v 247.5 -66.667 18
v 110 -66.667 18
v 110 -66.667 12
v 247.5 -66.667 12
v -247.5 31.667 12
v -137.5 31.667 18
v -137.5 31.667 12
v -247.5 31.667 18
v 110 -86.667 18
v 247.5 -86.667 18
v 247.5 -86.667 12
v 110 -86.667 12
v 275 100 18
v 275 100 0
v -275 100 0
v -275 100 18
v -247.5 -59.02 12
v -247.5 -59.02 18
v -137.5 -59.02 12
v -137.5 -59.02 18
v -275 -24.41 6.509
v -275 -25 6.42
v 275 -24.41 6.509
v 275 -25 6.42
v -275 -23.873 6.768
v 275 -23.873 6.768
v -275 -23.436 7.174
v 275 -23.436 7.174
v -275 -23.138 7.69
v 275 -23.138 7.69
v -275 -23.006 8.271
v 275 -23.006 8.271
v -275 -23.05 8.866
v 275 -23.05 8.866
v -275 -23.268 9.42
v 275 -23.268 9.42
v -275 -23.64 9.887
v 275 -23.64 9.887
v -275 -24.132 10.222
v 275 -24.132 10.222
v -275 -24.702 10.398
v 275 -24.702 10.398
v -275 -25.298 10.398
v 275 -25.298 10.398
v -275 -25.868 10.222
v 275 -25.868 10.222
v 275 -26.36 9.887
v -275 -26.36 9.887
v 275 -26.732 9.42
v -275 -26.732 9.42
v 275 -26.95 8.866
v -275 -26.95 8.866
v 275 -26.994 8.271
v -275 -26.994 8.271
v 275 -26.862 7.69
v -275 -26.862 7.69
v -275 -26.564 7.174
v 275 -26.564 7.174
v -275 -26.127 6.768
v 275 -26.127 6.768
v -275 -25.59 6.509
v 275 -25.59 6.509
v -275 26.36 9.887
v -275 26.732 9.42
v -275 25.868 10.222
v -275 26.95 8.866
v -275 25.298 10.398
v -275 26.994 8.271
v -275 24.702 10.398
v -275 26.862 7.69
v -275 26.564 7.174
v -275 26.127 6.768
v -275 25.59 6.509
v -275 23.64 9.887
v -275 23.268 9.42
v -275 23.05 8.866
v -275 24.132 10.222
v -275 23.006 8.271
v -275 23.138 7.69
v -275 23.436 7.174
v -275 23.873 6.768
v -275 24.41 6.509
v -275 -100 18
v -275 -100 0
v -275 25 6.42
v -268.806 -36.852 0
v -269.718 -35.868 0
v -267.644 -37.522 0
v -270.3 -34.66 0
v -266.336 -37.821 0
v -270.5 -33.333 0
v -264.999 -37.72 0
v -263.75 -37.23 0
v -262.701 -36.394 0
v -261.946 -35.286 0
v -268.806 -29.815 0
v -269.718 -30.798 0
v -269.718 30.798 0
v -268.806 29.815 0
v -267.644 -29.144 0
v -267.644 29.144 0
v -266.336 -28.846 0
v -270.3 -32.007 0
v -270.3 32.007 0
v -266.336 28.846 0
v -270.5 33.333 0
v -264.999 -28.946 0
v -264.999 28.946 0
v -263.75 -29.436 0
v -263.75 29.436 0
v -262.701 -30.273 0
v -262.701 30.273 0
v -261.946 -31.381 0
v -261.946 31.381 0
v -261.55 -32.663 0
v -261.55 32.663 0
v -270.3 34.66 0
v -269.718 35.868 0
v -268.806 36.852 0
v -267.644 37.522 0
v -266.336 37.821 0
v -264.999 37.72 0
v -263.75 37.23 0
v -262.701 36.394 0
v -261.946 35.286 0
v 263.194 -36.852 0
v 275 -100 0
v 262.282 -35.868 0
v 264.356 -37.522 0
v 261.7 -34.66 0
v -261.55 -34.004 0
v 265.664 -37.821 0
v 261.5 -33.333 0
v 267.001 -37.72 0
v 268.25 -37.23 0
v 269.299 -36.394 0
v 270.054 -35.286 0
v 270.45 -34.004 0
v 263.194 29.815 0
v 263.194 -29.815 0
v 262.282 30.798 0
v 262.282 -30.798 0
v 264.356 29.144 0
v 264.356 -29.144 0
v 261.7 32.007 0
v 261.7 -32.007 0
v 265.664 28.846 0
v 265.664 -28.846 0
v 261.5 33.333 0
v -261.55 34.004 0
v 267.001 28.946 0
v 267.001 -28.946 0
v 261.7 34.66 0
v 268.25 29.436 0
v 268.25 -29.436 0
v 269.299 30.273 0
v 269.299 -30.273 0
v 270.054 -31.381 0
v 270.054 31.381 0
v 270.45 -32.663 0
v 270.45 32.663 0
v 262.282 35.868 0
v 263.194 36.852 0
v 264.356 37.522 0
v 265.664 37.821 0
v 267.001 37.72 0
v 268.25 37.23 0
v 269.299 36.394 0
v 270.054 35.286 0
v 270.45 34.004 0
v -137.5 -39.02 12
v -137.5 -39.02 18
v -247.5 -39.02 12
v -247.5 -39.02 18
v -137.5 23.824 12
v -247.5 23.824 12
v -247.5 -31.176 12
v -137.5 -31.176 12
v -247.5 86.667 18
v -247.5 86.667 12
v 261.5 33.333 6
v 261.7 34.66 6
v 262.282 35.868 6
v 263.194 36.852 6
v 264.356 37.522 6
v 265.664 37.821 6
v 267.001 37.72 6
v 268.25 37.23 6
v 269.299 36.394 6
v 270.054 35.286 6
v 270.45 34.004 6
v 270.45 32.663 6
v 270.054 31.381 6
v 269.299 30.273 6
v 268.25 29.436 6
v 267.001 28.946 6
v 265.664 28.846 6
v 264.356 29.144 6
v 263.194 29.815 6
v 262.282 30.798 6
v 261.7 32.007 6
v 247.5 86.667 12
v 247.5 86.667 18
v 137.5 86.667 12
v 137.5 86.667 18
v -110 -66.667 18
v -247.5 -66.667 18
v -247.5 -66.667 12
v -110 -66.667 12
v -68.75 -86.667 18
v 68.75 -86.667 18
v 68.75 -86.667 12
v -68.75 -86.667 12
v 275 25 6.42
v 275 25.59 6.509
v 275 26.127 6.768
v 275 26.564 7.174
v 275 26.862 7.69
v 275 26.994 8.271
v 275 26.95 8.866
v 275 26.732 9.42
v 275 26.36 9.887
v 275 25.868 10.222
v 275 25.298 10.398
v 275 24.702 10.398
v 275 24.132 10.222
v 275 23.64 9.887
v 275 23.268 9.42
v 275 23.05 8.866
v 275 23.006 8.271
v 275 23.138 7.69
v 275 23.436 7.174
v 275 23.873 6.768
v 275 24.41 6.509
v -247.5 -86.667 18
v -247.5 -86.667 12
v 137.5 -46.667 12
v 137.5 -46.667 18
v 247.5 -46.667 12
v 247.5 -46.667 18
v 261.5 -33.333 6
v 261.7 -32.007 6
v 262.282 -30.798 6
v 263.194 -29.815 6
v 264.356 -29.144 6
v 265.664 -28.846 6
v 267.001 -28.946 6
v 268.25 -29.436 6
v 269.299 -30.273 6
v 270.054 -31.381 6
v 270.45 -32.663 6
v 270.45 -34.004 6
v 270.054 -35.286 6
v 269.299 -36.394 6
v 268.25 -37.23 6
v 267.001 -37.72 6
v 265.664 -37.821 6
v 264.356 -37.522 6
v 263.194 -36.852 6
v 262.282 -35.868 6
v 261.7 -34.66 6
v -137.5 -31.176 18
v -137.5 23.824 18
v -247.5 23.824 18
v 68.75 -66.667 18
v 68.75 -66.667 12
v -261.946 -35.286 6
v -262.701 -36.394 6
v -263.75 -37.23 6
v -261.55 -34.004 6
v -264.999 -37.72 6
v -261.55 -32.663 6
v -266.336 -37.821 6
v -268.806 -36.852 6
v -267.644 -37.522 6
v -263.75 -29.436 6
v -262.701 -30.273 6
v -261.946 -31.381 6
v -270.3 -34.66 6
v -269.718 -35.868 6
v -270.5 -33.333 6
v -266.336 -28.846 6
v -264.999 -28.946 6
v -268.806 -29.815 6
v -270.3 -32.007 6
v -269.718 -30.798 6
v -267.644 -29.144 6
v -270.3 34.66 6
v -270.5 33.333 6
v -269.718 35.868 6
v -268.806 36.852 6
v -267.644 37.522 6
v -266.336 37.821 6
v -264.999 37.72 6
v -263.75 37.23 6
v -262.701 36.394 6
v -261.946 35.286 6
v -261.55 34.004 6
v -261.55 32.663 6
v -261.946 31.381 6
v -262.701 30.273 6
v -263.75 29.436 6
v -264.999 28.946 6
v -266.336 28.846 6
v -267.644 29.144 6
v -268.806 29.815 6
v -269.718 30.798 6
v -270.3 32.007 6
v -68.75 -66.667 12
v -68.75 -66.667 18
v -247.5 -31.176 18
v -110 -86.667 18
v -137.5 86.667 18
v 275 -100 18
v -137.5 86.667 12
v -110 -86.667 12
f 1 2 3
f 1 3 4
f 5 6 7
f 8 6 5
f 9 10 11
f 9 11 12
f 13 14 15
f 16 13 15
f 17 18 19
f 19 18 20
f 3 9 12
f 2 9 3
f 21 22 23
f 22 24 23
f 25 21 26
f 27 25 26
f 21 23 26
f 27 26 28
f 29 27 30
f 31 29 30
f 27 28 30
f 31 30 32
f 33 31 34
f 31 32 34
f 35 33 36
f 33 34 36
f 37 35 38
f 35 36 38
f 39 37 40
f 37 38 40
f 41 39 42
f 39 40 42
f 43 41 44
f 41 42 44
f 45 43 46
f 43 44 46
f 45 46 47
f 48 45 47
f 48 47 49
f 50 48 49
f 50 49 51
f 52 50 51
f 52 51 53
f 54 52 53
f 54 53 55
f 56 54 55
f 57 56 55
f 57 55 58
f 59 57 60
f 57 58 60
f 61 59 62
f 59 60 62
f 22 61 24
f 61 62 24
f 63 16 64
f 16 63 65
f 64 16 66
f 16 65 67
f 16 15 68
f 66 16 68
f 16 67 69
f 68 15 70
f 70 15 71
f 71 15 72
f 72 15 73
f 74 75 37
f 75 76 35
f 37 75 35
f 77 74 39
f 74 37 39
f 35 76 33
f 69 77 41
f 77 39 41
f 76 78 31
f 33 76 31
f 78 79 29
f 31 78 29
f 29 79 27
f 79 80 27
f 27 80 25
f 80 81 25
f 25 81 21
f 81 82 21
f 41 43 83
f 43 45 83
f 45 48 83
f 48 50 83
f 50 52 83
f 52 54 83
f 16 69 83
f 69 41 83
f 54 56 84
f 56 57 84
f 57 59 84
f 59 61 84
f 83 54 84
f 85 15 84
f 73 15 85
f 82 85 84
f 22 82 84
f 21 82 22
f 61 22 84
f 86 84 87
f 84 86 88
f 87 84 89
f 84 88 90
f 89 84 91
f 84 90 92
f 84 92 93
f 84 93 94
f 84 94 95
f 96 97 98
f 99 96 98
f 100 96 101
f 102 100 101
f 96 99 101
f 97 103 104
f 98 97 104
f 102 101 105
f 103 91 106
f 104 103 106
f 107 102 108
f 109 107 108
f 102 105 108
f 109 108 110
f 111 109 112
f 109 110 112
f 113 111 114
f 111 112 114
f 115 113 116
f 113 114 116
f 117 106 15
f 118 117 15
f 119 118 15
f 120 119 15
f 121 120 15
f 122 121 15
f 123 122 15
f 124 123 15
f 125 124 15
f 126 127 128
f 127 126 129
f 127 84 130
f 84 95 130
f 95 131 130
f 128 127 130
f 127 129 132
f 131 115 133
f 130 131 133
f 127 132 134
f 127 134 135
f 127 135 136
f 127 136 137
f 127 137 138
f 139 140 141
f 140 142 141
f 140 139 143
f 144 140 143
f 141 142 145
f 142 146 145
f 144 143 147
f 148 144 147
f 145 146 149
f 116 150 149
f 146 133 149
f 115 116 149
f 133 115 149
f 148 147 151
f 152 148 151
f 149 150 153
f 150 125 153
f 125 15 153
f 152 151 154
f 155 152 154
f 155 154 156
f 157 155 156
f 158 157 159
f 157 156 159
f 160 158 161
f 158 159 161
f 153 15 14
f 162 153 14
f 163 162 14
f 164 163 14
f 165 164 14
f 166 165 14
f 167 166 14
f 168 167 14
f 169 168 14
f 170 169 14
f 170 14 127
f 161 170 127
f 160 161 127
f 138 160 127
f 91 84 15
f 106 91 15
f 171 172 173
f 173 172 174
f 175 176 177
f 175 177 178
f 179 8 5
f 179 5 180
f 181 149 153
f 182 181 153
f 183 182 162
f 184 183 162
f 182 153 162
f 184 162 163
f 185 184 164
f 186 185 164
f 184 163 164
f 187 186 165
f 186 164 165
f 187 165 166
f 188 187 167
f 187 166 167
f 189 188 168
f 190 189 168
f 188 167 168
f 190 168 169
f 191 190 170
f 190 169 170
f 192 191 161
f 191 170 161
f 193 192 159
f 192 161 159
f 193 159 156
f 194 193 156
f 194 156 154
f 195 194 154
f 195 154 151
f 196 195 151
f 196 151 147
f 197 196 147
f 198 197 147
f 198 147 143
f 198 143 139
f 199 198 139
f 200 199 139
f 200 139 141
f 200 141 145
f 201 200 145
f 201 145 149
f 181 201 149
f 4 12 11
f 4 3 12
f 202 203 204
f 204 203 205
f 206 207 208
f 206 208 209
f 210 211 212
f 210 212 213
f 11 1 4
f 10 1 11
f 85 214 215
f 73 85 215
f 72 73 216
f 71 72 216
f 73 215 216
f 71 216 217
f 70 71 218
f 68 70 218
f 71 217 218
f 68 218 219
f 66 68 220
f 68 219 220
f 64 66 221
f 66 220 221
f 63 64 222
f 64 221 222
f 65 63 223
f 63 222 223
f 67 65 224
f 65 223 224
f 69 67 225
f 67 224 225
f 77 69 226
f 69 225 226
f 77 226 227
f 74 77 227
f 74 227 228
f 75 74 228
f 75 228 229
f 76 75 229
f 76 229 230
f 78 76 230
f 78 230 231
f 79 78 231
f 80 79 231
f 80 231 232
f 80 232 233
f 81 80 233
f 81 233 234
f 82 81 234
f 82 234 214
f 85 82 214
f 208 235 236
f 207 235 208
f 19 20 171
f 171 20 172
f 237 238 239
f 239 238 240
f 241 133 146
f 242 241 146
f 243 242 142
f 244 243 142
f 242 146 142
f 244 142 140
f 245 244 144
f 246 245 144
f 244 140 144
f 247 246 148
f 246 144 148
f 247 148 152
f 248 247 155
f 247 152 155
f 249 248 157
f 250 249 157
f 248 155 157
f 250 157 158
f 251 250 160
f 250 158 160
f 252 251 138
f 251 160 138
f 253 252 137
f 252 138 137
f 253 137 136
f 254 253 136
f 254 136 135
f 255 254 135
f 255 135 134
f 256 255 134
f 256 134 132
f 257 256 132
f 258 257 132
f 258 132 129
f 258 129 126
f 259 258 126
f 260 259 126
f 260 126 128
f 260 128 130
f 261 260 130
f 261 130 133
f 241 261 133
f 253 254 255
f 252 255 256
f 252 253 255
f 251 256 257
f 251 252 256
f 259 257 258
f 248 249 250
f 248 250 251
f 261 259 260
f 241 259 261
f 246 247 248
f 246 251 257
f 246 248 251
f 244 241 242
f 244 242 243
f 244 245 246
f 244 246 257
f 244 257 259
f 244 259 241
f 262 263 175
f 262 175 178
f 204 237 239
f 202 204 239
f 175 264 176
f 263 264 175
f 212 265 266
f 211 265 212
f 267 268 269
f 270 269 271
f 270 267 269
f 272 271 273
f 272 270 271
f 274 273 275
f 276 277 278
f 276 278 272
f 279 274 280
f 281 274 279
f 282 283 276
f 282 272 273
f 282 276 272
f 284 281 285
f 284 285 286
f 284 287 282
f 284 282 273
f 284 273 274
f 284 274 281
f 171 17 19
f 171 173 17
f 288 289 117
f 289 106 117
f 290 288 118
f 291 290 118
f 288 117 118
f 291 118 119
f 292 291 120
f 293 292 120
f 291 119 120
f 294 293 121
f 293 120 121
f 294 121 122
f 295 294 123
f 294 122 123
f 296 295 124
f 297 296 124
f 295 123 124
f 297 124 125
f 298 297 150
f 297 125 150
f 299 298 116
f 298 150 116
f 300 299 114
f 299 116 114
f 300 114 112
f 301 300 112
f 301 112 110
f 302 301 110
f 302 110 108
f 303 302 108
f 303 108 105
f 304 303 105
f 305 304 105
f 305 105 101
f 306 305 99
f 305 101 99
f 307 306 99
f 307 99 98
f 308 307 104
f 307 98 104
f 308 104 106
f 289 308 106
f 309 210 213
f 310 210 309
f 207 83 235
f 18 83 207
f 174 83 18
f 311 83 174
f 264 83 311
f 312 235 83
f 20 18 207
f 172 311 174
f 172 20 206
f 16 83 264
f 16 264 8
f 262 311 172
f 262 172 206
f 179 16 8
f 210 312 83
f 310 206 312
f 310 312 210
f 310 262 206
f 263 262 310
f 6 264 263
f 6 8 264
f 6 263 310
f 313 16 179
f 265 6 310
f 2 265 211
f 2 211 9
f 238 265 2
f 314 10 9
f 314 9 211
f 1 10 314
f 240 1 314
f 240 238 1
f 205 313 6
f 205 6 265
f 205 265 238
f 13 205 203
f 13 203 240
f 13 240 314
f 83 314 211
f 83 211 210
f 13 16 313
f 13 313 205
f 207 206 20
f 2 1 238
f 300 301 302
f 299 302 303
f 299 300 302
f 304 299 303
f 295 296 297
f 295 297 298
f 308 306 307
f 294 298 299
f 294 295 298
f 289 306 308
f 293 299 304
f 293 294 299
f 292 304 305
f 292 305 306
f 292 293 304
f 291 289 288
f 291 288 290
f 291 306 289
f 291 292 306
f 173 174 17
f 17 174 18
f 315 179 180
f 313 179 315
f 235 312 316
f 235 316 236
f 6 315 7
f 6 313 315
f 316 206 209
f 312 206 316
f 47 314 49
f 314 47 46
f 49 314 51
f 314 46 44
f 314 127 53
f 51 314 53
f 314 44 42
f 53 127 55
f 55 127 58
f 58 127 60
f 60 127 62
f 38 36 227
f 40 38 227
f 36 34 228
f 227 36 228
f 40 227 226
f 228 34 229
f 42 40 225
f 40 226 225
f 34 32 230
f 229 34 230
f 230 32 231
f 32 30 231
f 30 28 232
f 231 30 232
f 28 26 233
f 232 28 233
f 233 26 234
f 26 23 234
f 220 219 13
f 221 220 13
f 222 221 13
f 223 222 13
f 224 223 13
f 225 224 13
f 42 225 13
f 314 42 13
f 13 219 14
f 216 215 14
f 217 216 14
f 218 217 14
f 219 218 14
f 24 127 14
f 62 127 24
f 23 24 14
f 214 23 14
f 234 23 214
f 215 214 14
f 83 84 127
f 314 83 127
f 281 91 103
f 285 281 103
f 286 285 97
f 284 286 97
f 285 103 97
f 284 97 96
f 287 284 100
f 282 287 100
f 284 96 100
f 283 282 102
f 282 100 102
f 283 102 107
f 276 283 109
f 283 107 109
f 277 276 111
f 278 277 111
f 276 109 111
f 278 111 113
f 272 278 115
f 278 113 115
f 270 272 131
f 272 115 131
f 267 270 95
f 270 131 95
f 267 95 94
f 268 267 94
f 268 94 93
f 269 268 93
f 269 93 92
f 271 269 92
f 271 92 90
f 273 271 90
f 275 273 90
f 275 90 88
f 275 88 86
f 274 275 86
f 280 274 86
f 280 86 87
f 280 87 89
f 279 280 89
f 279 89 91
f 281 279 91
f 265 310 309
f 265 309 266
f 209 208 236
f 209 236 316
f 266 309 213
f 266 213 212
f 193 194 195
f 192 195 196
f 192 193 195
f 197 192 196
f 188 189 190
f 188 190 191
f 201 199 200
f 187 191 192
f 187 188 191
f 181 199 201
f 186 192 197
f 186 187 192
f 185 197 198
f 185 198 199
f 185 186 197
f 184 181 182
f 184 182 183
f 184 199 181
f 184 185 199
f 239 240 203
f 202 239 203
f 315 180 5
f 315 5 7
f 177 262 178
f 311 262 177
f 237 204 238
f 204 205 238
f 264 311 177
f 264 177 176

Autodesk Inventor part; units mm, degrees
ref_plane "YZ Plane" through (0, 0, 0) normal (1, 0, 0) x (0, 1, 0)
ref_plane "XZ Plane" through (0, 0, 0) normal (0, 1, 0) x (-1, 0, 0)
ref_plane "XY Plane" through (0, 0, 0) normal (0, 0, 1) x (1, 0, 0)
sketch "Boceto1" plane through (0, 0, 0) normal (0, 0, 1) x (1, 0, 0)
  line L0 (-275, -100) -> (275, -100)
  line L1 (275, -100) -> (275, 100)
  line L2 (275, 100) -> (-275, 100)
  line L3 (-275, 100) -> (-275, -100)
  line L4 (-275, -100) -> (275, 100) construction
  line L5 (275, -100) -> (-275, 100) construction
  point P0 (0, 0)
  dimension "ancho" = 550
  dimension "alto" = 200
extrude "Extrusión1" add sketch "Boceto1" along normal blind 18
sketch "Boceto2" plane through (0, 0, 18) normal (0, 0, 1) x (1, 0, 0)
  line L0 (247.5, -86.6667) -> (110, -86.6667)
  line L1 (110, -86.6667) -> (110, -66.6667)
  line L2 (110, -66.6667) -> (247.5, -66.6667)
  line L3 (247.5, -66.6667) -> (247.5, -86.6667)
  line L4 (275, -100) -> (275, 100) projected
  line L5 (-110, -86.6667) -> (-247.5, -86.6667)
  line L6 (-247.5, -86.6667) -> (-247.5, -66.6667)
  line L7 (-247.5, -66.6667) -> (-110, -66.6667)
  line L8 (-110, -66.6667) -> (-110, -86.6667)
  line L9 (-275, 100) -> (-275, -100) projected
  line L10 (-275, -100) -> (275, -100) projected
  line L11 (68.75, -86.6667) -> (-68.75, -86.6667)
  line L12 (-68.75, -86.6667) -> (-68.75, -66.6667)
  line L13 (-68.75, -66.6667) -> (68.75, -66.6667)
  line L14 (68.75, -66.6667) -> (68.75, -86.6667)
  line L15 (275, 100) -> (-275, 100) projected
  line L16 (247.5, 86.6667) -> (137.5, 86.6667)
  line L17 (137.5, 86.6667) -> (137.5, -46.6667)
  line L18 (137.5, -46.6667) -> (247.5, -46.6667)
  line L19 (247.5, -46.6667) -> (247.5, 86.6667)
  line L20 (-247.5, 86.6667) -> (-137.5, 86.6667)
  line L21 (-137.5, 86.6667) -> (-137.5, 31.6667)
  line L22 (-137.5, 31.6667) -> (-247.5, 31.6667)
  line L23 (-247.5, 31.6667) -> (-247.5, 86.6667)
  line L24 (-247.5, 23.8235) -> (-137.5, 23.8235)
  line L25 (-137.5, 23.8235) -> (-137.5, -31.1765)
  line L26 (-137.5, -31.1765) -> (-247.5, -31.1765)
  line L27 (-247.5, -31.1765) -> (-247.5, 23.8235)
  line L28 (-247.5, -59.0196) -> (-137.5, -59.0196)
  line L29 (-137.5, -59.0196) -> (-137.5, -39.0196)
  line L30 (-137.5, -39.0196) -> (-247.5, -39.0196)
  line L31 (-247.5, -39.0196) -> (-247.5, -59.0196)
  point P0 (0, 0)
  dimension "d4" = 137.5
  dimension "d5" = 20
  dimension "d6" = 27.5
  dimension "d7" = 137.5
  dimension "d8" = 20
  dimension "d9" = 27.5
  dimension "d10" = 13.3333
  dimension "d11" = 13.3333
  dimension "d12" = 137.5
  dimension "d13" = 41.25
  dimension "d14" = 41.25
  dimension "d15" = 20
  dimension "d17" = 110
  dimension "d18" = 133.3333
  dimension "d19" = 27.5
  dimension "d20" = 13.3333
  dimension "d21" = 110
  dimension "d22" = 55
  dimension "d23" = 27.5
  dimension "d24" = 13.3333
  dimension "d25" = 110
  dimension "d26" = 55
  dimension "d27" = 27.5
  dimension "d28" = 7.8431
  dimension "d29" = 110
  dimension "d30" = 20
  dimension "d31" = 7.8431
  dimension "d32" = 7.6471
extrude "Extrusión2" cut sketch "Boceto2" against normal blind 6 contours L0 L1 L2 L3 | L5 L6 L7 L8 | L11 L12 L13 L14 | L19 L18 L17 L16 | L20 L21 L22 L23 | L24 L25 L26 L27 | L31 L30 L29 L28
sketch "Boceto3" plane through (0, 0, 0) normal (0, 0, -1) x (-1, 0, 0)
  circle A0 centre (266, -33.3333) radius 4.5
  circle A1 centre (266, 33.3333) radius 4.5
  circle A2 centre (-266, 33.3333) radius 4.5
  circle A3 centre (-266, -33.3333) radius 4.5
  line L0 (275, 100) -> (275, -100) projected
  line L1 (275, -100) -> (-275, -100) projected
  line L2 (-275, 100) -> (275, 100) projected
  line L3 (-275, -100) -> (-275, 100) projected
  point P0 (0, 0)
  dimension "d35" = 9
  dimension "d36" = 9
  dimension "d37" = 9
  dimension "d38" = 9
  dimension "d39" = 9
  dimension "d40" = 66.6667
  dimension "d41" = 9
  dimension "d42" = 66.6667
  dimension "d43" = 9
  dimension "d44" = 66.6667
  dimension "d45" = 9
  dimension "d46" = 66.6667
extrude "Extrusión3" cut sketch "Boceto3" against normal blind 6 contours A0 | A1 | A2 | A3
sketch "Boceto4" plane through (275, -100, 0) normal (1, 0, 0) x (0, 0, -1)
  circle A0 centre (-8.4205, 125) radius 2
  circle A1 centre (-8.4205, 75) radius 2
  line L0 (0, 0) -> (-18, 0) projected
  point P0 (0, 100)
  point P1 (-9, 0)
  dimension "d49" = 4
  dimension "d50" = 4
  dimension "d51" = 50
  dimension "d52" = 75
extrude "Extrusión4" cut sketch "Boceto4" against normal blind 600
equation "\"d4\" = 0.25 * ancho"
equation "\"d5\" = 0.1 * alto"
equation "\"d6\" = 0.05 * ancho"
equation "\"d7\" = d4"
equation "\"d8\" = d5"
equation "\"d9\" = d6"
equation "\"d10\" = 0.0666667 * alto"
equation "\"d11\" = 0.0666667 * alto"
equation "\"d12\" = d4"
equation "\"d13\" = d14"
equation "\"d15\" = d5"
equation "\"d17\" = 0.2 * ancho"
equation "\"d18\" = 0.666667 * alto"
equation "\"d19\" = d6"
equation "\"d20\" = d10"
equation "\"d21\" = 0.2 * ancho"
equation "\"d22\" = 0.1 * ancho"
equation "\"d23\" = d9"
equation "\"d24\" = d11"
equation "\"d25\" = d21"
equation "\"d26\" = d22"
equation "\"d27\" = d23"
equation "\"d28\" = 0.0392157 * alto"
equation "\"d29\" = d21"
equation "\"d30\" = d5"
equation "\"d31\" = d28"
equation "\"d33\" = 0.333333 * grosor"
equation "\"d35\" = 0.5 * grosor"
equation "\"d36\" = d35"
equation "\"d37\" = d35"
equation "\"d38\" = d35"
equation "\"d39\" = 0.5 * grosor"
equation "\"d40\" = 0.333333 * alto"
equation "\"d41\" = d39"
equation "\"d42\" = d40"
equation "\"d43\" = d39"
equation "\"d44\" = d40"
equation "\"d45\" = d39"
equation "\"d46\" = d40"
equation "\"d47\" = 0.333333 * grosor"
equation "\"grosor\" = 18"
properties part number "APM_003-2"
